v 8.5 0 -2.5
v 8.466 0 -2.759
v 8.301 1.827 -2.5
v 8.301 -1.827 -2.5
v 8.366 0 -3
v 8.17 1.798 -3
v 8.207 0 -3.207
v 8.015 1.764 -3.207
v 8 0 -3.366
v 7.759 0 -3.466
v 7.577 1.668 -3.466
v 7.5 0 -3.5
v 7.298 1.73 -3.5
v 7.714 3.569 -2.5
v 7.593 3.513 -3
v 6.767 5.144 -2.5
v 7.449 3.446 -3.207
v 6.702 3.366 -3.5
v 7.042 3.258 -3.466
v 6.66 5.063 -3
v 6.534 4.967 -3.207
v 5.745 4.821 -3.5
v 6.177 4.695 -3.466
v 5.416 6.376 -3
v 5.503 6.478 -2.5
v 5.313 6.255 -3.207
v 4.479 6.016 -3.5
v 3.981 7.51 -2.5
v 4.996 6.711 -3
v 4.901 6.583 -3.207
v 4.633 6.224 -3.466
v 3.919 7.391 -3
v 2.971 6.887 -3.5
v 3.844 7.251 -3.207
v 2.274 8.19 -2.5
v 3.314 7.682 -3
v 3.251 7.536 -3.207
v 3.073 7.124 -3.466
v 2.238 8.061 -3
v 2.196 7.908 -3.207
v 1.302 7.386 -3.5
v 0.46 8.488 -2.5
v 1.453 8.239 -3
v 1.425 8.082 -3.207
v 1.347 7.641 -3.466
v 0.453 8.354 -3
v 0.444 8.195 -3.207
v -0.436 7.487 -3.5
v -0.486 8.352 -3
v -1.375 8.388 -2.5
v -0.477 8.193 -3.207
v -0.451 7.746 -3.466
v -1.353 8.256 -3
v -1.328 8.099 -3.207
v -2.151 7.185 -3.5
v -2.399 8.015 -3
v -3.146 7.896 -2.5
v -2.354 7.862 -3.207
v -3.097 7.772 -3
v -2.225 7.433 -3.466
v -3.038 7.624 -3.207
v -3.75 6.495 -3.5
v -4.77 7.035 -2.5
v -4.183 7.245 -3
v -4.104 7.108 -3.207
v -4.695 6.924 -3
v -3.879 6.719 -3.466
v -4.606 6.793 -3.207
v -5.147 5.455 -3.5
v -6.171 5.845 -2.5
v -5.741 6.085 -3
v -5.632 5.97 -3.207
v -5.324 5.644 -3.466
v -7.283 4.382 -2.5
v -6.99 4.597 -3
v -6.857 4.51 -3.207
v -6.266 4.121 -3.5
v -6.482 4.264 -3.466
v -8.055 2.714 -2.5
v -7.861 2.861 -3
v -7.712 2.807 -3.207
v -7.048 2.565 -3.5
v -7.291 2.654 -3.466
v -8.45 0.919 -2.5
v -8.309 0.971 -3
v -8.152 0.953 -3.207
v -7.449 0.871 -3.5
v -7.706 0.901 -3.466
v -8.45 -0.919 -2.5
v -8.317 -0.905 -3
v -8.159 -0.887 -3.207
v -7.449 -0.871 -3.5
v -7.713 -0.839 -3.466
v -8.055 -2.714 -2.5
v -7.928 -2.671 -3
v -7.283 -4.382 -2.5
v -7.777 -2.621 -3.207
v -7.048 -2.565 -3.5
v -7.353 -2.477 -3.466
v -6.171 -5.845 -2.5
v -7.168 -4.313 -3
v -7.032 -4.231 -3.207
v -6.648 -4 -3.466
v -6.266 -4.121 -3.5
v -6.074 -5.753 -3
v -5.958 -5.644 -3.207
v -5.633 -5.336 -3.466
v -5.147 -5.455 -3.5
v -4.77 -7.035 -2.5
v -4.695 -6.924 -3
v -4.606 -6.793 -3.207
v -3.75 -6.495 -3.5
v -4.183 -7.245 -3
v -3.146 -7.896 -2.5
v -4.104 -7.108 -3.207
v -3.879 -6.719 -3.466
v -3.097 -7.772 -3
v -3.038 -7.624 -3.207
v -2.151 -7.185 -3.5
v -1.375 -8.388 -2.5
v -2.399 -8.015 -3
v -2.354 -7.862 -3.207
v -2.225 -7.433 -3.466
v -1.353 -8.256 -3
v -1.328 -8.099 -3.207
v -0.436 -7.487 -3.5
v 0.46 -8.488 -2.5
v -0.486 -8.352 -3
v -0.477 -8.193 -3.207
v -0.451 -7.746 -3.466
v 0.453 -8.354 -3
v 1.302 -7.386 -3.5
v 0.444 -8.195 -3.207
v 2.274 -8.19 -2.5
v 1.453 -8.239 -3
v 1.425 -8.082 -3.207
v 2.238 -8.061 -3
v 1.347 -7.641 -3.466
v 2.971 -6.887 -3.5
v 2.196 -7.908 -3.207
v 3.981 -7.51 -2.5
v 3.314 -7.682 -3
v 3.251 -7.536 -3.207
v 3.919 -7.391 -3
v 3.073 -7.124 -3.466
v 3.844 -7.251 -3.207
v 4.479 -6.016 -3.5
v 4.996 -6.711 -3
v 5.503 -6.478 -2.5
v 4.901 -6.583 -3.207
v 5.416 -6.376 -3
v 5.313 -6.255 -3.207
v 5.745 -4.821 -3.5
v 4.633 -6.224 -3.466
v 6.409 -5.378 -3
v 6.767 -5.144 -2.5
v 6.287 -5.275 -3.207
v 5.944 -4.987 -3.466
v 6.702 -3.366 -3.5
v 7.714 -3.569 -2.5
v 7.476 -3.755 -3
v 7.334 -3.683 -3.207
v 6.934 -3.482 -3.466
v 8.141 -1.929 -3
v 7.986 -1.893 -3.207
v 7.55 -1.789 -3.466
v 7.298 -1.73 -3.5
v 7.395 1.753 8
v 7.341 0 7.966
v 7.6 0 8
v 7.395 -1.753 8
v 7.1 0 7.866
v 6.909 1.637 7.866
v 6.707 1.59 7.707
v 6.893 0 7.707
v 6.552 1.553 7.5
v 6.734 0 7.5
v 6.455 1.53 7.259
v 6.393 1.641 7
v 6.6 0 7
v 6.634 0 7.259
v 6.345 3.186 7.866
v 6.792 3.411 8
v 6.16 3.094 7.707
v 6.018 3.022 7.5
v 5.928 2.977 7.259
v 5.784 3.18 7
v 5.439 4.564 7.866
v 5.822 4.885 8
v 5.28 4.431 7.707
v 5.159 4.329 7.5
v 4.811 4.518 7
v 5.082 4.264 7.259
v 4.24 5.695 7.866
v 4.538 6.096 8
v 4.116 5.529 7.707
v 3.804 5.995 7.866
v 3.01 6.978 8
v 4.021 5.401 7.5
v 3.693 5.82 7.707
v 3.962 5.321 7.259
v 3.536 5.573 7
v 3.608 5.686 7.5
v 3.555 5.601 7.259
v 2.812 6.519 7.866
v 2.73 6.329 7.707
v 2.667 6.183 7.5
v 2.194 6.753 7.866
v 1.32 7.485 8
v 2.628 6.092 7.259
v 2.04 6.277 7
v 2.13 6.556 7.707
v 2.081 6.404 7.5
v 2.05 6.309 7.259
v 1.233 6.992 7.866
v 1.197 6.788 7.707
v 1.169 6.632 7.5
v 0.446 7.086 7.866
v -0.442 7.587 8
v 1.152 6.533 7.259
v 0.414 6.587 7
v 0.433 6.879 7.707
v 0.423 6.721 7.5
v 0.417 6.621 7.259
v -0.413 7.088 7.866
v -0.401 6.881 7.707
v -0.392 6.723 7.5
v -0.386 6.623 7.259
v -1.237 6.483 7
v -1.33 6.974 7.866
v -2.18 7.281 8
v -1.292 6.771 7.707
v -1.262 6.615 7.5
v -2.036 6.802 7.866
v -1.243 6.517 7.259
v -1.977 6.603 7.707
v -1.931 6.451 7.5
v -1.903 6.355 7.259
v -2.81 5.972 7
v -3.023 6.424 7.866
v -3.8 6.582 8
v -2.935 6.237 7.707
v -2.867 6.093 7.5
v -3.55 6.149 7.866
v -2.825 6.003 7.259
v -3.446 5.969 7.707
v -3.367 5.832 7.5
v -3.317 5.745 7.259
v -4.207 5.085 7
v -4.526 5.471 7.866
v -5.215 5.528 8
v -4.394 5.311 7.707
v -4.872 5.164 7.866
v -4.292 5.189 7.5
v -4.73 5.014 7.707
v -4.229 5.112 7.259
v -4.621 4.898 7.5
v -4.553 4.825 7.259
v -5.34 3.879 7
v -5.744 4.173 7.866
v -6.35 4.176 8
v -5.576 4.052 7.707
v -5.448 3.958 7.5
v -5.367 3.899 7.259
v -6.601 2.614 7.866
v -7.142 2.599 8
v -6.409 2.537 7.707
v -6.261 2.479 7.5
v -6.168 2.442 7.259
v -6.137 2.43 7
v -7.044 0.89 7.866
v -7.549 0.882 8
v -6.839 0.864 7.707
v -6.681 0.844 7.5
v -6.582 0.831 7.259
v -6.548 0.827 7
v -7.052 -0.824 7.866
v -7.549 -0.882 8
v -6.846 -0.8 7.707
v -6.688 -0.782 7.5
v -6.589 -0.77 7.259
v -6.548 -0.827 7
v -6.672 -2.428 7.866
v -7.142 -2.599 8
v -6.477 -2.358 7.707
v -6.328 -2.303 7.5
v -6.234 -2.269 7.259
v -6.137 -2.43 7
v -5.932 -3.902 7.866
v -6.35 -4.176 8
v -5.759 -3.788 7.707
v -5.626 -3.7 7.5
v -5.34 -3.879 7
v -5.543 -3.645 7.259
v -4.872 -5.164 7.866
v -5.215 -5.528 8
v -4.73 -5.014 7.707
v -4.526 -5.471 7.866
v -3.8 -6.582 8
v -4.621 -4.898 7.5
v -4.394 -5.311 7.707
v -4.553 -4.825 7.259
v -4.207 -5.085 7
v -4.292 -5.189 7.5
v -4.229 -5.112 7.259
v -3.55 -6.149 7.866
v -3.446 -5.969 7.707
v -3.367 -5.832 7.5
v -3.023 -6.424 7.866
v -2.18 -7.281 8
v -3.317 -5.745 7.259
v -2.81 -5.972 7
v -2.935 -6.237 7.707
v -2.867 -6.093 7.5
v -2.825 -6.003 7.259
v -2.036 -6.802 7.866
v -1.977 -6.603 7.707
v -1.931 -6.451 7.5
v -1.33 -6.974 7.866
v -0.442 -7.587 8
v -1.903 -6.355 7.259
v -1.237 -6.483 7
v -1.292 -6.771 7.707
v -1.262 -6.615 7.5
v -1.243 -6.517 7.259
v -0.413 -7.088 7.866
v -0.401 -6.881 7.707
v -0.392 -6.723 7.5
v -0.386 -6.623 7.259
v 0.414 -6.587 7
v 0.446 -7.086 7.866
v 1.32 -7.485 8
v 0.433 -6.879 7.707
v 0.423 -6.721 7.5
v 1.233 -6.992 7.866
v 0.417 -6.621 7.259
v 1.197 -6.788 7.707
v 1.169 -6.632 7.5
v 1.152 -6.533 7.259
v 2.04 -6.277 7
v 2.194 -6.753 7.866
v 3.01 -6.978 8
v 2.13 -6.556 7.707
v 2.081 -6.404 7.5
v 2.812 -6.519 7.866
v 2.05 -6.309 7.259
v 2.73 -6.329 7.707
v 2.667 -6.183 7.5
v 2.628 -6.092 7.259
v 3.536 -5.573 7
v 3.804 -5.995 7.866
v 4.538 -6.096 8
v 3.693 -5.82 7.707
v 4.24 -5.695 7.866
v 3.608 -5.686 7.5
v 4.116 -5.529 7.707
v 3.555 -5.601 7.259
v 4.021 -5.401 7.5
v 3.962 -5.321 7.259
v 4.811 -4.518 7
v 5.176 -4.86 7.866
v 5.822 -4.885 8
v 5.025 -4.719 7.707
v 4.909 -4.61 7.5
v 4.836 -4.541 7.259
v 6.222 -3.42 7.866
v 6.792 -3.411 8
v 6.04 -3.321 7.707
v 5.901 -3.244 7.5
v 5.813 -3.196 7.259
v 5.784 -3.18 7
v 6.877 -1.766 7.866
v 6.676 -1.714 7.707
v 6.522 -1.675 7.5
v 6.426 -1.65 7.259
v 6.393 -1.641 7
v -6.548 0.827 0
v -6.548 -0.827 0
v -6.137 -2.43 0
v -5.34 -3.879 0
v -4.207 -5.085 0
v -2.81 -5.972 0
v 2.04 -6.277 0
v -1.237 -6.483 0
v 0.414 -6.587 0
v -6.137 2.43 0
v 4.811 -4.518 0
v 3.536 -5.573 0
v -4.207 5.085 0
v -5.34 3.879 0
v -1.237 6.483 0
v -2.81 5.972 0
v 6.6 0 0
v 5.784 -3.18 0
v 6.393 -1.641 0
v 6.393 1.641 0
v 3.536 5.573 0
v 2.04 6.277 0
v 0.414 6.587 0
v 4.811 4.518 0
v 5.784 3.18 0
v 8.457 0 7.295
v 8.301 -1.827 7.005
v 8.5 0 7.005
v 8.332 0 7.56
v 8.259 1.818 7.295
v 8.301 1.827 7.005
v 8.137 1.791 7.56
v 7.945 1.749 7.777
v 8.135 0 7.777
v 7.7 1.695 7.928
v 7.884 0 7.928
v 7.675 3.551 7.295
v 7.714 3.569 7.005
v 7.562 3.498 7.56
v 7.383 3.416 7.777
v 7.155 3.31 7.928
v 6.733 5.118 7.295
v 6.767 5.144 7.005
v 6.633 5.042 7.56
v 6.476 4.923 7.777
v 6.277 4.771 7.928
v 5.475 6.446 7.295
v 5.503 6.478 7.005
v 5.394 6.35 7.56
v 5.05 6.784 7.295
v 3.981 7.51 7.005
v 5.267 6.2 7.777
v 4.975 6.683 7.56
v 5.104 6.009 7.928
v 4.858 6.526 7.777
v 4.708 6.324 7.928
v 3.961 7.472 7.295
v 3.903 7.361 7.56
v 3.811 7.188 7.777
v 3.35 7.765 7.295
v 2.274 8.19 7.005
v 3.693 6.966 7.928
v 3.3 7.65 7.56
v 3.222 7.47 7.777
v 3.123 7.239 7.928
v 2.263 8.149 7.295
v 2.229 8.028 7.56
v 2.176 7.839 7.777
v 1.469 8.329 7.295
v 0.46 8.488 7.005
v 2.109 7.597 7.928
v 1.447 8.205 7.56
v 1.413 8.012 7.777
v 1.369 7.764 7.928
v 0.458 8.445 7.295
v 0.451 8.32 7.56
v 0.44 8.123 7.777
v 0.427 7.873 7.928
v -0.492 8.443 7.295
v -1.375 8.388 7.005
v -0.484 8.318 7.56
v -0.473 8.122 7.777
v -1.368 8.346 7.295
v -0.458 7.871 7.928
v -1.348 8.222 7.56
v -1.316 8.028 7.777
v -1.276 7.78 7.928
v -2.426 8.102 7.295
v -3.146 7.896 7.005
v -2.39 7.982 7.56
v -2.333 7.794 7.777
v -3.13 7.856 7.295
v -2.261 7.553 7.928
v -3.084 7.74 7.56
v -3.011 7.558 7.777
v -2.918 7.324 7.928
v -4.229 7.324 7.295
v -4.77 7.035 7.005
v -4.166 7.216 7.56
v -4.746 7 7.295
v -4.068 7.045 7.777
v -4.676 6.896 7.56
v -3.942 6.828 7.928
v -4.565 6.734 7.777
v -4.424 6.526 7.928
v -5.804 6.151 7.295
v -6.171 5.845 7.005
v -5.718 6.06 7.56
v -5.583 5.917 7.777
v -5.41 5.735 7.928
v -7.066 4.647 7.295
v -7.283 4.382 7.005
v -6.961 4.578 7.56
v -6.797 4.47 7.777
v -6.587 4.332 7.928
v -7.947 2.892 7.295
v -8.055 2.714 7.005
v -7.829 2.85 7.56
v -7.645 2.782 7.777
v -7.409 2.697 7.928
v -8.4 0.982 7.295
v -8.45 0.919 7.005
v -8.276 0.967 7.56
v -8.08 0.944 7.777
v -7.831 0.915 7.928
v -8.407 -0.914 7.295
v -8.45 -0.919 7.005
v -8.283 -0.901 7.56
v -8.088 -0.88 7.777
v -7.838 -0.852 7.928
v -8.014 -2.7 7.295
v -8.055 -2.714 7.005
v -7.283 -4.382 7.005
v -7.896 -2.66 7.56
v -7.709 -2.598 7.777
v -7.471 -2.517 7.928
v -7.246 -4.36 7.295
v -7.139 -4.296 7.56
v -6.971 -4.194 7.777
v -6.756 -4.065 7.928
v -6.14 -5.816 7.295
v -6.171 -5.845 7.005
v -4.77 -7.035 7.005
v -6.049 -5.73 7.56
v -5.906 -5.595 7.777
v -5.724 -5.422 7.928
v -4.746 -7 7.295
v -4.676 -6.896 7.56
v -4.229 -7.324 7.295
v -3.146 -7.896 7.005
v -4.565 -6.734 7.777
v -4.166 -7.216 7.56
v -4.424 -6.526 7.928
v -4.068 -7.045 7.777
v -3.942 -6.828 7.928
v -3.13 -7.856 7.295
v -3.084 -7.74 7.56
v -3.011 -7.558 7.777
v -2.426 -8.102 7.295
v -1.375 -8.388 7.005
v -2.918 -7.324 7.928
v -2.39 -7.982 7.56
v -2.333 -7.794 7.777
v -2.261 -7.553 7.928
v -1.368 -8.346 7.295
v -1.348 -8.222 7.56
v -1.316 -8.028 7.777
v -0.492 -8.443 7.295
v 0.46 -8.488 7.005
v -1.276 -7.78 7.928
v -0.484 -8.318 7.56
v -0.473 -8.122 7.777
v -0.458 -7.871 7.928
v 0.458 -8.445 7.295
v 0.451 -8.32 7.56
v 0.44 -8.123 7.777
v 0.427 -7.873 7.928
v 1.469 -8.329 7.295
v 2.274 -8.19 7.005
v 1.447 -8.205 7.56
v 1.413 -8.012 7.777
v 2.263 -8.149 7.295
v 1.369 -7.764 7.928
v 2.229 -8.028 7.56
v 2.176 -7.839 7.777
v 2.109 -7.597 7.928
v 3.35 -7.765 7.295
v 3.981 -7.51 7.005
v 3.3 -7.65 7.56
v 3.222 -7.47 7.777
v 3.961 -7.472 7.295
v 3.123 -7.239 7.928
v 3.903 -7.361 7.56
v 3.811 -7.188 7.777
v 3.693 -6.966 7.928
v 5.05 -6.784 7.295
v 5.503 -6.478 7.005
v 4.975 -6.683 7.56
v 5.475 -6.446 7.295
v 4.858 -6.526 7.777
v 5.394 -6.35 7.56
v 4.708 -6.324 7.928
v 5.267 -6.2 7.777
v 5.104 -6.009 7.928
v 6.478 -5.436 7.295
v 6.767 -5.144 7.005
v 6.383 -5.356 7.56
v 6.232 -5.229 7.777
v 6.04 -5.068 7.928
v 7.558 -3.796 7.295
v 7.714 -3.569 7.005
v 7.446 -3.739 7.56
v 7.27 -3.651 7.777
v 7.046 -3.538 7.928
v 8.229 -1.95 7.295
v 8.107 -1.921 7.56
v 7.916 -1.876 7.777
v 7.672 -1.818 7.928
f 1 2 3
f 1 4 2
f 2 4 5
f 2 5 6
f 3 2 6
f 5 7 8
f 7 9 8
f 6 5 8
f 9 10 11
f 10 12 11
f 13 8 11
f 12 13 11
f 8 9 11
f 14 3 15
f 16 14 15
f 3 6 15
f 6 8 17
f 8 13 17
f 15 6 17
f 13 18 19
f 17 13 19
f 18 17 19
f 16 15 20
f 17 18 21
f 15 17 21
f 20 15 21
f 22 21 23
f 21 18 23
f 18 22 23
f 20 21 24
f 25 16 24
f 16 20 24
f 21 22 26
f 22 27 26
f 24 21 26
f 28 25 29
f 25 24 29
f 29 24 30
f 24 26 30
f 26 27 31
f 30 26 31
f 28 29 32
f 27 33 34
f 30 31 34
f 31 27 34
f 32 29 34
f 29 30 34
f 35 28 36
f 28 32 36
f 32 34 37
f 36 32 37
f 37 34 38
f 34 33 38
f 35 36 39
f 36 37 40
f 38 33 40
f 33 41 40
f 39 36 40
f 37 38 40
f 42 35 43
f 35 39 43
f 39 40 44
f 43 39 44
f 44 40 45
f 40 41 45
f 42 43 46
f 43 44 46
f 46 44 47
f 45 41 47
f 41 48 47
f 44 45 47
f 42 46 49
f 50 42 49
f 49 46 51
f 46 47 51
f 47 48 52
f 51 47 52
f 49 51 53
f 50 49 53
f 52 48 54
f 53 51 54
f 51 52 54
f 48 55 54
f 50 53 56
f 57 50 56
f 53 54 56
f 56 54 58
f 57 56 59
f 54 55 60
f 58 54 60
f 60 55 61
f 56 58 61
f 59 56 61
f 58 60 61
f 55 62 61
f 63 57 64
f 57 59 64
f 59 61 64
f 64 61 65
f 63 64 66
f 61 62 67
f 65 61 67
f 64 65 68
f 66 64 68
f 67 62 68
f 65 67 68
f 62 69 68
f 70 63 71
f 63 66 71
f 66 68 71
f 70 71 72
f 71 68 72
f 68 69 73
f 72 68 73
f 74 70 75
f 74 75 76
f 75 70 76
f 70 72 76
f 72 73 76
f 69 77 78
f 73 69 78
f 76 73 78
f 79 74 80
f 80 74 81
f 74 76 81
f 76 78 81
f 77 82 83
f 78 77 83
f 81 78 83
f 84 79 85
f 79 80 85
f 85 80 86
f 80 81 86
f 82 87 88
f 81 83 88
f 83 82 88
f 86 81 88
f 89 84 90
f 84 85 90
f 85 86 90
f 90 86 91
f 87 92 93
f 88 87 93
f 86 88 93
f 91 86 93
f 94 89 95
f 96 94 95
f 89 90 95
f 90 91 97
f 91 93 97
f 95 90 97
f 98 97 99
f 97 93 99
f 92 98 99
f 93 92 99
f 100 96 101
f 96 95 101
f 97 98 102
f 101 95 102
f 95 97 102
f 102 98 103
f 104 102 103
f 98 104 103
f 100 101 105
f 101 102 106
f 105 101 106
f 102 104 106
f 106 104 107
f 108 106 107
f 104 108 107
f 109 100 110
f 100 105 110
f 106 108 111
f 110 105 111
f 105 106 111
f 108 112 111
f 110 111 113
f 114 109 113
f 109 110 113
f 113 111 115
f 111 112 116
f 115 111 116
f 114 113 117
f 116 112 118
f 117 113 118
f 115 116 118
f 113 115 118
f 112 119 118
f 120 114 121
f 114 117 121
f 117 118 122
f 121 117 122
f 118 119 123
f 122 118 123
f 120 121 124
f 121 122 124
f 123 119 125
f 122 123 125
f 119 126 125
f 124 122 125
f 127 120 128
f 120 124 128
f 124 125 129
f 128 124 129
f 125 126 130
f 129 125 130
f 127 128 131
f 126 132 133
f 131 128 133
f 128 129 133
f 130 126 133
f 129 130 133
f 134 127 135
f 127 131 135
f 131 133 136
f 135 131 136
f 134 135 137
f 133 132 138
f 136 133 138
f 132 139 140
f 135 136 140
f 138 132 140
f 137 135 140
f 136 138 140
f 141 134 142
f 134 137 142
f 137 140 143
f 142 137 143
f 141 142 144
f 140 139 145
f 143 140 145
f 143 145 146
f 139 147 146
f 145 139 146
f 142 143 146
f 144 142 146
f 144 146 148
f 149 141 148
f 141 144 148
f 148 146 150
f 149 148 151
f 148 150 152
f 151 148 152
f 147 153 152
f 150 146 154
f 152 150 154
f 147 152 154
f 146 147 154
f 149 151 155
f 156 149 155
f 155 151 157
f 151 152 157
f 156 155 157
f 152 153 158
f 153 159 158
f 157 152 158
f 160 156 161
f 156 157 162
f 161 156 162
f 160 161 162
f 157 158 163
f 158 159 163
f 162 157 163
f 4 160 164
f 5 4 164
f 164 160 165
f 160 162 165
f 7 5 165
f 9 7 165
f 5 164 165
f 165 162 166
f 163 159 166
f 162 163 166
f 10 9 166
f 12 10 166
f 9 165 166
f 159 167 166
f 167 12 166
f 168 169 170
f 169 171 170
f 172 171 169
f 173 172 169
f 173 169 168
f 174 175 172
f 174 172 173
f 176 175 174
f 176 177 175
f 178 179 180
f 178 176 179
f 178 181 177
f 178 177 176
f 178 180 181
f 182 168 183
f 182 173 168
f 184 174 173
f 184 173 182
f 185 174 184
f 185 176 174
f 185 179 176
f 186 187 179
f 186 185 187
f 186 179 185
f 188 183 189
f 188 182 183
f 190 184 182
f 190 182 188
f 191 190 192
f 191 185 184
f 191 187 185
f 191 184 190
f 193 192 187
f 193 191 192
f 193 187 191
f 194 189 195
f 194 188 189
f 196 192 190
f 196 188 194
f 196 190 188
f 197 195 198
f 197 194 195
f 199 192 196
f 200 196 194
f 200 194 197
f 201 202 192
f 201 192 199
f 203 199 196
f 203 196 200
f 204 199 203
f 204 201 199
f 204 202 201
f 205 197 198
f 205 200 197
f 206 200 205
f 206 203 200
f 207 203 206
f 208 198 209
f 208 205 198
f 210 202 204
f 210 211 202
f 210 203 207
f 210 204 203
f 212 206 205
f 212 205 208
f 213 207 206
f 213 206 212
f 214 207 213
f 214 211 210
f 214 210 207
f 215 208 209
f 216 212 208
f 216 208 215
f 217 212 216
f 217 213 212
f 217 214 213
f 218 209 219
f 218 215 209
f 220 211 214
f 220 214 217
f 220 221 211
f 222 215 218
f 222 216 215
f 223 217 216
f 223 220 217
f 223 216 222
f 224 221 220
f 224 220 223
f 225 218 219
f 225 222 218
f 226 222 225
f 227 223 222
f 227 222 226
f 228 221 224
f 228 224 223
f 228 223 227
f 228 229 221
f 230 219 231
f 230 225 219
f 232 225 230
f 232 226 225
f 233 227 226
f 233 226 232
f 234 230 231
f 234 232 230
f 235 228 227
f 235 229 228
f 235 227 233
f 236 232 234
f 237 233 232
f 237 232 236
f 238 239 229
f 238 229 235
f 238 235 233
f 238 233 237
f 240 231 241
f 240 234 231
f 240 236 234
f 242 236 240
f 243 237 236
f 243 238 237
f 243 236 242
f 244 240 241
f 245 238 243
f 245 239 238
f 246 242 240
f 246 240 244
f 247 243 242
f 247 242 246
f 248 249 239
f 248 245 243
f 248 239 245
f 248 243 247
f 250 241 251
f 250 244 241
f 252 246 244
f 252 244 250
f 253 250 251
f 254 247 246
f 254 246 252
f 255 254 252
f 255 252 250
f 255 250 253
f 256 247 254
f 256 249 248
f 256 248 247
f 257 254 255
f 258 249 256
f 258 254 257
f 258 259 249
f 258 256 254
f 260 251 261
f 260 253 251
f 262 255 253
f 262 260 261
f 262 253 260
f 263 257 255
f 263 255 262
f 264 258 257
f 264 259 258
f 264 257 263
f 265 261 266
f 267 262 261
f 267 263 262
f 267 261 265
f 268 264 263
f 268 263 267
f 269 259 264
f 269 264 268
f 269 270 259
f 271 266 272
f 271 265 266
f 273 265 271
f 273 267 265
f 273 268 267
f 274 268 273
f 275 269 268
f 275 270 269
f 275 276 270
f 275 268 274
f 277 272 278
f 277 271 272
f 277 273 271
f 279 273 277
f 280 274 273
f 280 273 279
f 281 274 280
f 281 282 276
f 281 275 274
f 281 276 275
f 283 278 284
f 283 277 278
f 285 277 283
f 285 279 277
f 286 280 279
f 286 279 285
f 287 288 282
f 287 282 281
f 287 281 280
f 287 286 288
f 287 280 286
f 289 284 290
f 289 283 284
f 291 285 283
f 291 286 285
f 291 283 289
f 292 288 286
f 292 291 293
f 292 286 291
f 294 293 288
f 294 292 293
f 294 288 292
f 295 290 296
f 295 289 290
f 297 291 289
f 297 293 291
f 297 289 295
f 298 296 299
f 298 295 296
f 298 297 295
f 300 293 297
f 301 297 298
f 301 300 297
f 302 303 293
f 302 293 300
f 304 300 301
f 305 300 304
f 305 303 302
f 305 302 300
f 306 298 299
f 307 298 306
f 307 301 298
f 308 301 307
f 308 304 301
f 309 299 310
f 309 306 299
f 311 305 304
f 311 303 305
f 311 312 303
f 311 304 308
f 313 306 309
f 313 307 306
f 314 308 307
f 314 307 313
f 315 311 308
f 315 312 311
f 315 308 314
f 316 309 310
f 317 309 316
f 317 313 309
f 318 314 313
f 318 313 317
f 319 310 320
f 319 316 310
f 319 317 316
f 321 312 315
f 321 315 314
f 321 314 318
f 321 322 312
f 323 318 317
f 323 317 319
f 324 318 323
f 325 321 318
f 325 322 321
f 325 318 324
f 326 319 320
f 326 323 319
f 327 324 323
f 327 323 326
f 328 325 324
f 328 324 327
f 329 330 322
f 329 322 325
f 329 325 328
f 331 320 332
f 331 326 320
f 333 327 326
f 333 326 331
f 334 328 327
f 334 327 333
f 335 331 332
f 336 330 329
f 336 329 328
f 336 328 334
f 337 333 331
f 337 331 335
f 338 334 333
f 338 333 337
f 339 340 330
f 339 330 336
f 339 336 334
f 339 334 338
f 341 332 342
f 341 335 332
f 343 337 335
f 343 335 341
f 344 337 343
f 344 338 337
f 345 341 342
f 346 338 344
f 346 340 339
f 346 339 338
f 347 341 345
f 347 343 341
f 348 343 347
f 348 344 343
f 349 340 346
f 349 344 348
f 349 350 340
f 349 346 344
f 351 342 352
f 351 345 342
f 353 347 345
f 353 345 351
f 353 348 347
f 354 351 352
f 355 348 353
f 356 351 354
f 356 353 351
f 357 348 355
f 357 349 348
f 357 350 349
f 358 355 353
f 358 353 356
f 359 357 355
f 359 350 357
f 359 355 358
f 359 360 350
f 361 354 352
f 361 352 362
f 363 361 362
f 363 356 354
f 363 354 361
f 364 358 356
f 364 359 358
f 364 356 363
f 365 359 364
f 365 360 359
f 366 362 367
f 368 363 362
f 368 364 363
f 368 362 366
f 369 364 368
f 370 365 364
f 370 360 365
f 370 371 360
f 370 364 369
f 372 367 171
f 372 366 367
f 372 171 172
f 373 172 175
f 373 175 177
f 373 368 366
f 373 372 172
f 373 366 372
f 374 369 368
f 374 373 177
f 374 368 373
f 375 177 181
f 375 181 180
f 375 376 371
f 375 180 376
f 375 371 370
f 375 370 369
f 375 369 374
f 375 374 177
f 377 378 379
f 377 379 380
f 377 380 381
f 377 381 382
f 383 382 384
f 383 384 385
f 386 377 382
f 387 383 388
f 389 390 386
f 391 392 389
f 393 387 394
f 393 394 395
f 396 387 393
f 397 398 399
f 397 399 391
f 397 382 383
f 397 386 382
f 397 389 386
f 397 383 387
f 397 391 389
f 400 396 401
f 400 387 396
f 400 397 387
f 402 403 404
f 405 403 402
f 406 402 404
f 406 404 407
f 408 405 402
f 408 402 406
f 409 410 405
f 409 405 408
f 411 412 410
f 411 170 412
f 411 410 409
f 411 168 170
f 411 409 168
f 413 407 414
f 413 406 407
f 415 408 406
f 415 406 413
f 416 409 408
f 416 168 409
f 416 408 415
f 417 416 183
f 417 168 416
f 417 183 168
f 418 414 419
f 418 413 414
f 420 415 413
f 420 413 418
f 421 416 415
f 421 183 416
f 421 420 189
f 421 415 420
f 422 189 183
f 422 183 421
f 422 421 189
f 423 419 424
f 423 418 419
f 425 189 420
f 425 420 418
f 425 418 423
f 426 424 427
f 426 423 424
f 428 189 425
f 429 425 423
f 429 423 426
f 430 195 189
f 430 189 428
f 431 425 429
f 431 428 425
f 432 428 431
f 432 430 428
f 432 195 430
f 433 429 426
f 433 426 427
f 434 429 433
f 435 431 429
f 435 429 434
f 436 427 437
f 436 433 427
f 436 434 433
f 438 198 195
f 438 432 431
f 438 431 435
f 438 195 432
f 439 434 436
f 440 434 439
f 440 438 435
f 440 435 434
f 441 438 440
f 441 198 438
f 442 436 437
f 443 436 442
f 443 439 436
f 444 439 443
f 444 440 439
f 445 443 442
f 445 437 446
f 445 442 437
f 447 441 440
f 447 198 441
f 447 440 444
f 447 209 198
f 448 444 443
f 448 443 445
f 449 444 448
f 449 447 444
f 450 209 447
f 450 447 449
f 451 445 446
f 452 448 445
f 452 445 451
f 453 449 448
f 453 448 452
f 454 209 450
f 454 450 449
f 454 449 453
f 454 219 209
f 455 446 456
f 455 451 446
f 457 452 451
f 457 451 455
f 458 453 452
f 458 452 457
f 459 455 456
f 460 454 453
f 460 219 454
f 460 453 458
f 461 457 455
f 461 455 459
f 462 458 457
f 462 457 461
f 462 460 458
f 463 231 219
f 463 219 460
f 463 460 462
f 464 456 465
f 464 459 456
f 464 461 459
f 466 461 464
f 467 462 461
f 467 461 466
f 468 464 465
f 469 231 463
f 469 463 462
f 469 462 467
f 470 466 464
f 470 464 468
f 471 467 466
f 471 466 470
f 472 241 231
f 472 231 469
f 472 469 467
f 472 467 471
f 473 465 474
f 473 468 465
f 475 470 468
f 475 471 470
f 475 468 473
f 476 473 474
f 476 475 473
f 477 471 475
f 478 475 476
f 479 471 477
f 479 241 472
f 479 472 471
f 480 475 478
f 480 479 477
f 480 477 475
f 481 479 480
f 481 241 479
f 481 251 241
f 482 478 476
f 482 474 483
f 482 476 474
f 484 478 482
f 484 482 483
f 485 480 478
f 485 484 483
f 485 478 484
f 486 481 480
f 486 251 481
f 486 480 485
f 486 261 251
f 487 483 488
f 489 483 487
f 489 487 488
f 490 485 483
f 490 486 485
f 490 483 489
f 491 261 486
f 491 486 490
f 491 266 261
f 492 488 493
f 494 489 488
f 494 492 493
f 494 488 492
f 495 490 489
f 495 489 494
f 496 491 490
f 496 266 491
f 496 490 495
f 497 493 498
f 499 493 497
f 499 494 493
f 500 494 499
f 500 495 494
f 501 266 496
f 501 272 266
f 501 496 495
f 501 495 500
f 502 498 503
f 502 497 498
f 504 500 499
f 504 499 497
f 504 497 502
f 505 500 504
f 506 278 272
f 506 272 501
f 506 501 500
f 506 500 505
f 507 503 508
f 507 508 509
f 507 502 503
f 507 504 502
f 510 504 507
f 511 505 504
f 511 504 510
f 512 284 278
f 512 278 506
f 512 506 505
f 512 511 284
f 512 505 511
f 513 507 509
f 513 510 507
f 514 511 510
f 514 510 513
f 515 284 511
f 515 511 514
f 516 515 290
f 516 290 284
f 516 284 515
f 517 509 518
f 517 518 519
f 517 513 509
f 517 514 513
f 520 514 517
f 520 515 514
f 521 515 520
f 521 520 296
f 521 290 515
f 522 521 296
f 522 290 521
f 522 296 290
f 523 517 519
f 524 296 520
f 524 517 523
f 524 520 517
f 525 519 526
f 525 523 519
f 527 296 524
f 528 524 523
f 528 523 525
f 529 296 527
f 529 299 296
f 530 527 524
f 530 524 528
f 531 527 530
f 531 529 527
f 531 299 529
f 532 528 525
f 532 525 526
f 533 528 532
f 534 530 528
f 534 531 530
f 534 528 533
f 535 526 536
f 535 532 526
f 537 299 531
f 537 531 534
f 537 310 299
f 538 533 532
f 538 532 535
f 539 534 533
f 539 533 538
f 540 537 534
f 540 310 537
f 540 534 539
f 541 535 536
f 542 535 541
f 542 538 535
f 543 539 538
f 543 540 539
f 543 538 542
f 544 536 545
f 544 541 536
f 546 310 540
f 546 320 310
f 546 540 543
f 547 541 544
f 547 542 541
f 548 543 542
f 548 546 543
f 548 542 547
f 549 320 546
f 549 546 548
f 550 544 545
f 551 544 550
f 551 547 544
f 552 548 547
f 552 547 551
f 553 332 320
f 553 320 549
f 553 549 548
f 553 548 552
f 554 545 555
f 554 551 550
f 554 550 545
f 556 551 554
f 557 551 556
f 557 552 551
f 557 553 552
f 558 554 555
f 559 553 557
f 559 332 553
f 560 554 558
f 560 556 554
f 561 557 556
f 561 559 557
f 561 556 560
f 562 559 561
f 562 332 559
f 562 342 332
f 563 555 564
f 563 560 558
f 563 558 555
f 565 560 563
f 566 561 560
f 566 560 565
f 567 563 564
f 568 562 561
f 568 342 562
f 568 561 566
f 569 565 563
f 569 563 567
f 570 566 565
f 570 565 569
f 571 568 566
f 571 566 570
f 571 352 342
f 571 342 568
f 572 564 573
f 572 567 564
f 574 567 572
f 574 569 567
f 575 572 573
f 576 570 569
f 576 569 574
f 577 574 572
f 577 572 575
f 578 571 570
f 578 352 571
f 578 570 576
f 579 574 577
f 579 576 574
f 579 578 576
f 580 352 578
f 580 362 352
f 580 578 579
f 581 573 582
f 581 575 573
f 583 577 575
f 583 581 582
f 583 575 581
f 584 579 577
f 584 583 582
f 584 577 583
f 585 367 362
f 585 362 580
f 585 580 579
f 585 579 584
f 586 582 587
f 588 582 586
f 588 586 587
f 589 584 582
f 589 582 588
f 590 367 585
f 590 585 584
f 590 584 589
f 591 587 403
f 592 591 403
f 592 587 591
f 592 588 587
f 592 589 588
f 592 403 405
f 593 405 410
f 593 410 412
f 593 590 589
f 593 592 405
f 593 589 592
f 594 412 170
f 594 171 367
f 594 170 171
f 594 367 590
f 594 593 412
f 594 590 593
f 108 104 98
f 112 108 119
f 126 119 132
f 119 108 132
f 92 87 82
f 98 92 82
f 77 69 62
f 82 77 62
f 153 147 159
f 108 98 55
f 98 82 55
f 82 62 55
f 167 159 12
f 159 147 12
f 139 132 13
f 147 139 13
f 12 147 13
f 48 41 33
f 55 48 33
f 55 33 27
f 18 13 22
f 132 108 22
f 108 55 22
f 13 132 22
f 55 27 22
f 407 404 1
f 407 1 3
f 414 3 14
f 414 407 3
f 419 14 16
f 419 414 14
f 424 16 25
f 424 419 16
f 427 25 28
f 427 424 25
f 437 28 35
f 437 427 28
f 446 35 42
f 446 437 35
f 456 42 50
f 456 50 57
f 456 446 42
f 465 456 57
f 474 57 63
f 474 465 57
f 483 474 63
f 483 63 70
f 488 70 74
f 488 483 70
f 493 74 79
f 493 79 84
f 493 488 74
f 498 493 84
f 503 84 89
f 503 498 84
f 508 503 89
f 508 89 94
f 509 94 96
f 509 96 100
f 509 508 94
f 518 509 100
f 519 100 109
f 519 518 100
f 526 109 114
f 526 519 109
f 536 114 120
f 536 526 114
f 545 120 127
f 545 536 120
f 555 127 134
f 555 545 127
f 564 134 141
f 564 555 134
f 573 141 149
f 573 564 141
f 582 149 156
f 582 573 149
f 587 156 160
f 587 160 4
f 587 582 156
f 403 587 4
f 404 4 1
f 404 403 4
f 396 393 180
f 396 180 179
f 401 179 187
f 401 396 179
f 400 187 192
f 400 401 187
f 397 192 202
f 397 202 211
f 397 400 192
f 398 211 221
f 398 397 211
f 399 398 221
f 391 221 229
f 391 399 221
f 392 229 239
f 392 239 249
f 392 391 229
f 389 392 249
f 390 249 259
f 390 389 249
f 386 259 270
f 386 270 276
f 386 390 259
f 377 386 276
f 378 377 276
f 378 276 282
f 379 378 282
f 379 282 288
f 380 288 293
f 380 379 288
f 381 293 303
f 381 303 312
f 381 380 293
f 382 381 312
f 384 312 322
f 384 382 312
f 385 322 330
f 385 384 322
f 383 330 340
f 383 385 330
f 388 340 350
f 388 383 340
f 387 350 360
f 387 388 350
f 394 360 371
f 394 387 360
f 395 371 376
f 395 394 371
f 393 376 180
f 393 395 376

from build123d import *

# Parameters (mm, degrees)
F0_R     = 8.5
F1_DEPTH = 3.5
F2_R     = 8.5
F2_R_2   = 6.6
F3_DEPTH = 8
F4_R     = 1


# Not quite as in the source:
# - a fillet or chamfer that OpenCascade refuses, or shapes differently, is made with other operations: its cross-section is extruded or revolved along the edge and cut away or added
# - a feature names something its author has since deleted; it is built from what else it names


with BuildPart() as f1:
    # F0 (on Top) → F1 (new body)
    with BuildSketch(Plane.XY):
        Circle(F0_R)
    extrude(amount=-F1_DEPTH)

    # F2 (on face) → F3 (join)
    with BuildSketch(Plane.XY):
        Circle(F2_R)
        Circle(F2_R_2, mode=Mode.SUBTRACT)
    extrude(amount=F3_DEPTH)

    # F4
    f4_edges = [f1.edges().sort_by_distance(p)[0] for p in [
        (-6.6, 0, 8),
        (-8.5, 0, -3.5),
    ]]
    fillet(f4_edges, radius=F4_R)

    # F5: fillet of radius 1 on 1 edges, made by hand

    # F5_s1 → F5_t2 (revolve, cut)
    with BuildSketch(Plane.XZ):
        with BuildLine():
            ThreePointArc((8.5, 7.0050125629), (8.2416198487, 7.6758329561), (7.6, 8))
            Line((7.6, 8), (8.5, 8))
            Line((8.5, 8), (8.5, 7.0050125629))
        make_face()
    revolve(axis=Axis((0, 0, 8), (0, 0, 1)), mode=Mode.SUBTRACT)


solid = f1.part
